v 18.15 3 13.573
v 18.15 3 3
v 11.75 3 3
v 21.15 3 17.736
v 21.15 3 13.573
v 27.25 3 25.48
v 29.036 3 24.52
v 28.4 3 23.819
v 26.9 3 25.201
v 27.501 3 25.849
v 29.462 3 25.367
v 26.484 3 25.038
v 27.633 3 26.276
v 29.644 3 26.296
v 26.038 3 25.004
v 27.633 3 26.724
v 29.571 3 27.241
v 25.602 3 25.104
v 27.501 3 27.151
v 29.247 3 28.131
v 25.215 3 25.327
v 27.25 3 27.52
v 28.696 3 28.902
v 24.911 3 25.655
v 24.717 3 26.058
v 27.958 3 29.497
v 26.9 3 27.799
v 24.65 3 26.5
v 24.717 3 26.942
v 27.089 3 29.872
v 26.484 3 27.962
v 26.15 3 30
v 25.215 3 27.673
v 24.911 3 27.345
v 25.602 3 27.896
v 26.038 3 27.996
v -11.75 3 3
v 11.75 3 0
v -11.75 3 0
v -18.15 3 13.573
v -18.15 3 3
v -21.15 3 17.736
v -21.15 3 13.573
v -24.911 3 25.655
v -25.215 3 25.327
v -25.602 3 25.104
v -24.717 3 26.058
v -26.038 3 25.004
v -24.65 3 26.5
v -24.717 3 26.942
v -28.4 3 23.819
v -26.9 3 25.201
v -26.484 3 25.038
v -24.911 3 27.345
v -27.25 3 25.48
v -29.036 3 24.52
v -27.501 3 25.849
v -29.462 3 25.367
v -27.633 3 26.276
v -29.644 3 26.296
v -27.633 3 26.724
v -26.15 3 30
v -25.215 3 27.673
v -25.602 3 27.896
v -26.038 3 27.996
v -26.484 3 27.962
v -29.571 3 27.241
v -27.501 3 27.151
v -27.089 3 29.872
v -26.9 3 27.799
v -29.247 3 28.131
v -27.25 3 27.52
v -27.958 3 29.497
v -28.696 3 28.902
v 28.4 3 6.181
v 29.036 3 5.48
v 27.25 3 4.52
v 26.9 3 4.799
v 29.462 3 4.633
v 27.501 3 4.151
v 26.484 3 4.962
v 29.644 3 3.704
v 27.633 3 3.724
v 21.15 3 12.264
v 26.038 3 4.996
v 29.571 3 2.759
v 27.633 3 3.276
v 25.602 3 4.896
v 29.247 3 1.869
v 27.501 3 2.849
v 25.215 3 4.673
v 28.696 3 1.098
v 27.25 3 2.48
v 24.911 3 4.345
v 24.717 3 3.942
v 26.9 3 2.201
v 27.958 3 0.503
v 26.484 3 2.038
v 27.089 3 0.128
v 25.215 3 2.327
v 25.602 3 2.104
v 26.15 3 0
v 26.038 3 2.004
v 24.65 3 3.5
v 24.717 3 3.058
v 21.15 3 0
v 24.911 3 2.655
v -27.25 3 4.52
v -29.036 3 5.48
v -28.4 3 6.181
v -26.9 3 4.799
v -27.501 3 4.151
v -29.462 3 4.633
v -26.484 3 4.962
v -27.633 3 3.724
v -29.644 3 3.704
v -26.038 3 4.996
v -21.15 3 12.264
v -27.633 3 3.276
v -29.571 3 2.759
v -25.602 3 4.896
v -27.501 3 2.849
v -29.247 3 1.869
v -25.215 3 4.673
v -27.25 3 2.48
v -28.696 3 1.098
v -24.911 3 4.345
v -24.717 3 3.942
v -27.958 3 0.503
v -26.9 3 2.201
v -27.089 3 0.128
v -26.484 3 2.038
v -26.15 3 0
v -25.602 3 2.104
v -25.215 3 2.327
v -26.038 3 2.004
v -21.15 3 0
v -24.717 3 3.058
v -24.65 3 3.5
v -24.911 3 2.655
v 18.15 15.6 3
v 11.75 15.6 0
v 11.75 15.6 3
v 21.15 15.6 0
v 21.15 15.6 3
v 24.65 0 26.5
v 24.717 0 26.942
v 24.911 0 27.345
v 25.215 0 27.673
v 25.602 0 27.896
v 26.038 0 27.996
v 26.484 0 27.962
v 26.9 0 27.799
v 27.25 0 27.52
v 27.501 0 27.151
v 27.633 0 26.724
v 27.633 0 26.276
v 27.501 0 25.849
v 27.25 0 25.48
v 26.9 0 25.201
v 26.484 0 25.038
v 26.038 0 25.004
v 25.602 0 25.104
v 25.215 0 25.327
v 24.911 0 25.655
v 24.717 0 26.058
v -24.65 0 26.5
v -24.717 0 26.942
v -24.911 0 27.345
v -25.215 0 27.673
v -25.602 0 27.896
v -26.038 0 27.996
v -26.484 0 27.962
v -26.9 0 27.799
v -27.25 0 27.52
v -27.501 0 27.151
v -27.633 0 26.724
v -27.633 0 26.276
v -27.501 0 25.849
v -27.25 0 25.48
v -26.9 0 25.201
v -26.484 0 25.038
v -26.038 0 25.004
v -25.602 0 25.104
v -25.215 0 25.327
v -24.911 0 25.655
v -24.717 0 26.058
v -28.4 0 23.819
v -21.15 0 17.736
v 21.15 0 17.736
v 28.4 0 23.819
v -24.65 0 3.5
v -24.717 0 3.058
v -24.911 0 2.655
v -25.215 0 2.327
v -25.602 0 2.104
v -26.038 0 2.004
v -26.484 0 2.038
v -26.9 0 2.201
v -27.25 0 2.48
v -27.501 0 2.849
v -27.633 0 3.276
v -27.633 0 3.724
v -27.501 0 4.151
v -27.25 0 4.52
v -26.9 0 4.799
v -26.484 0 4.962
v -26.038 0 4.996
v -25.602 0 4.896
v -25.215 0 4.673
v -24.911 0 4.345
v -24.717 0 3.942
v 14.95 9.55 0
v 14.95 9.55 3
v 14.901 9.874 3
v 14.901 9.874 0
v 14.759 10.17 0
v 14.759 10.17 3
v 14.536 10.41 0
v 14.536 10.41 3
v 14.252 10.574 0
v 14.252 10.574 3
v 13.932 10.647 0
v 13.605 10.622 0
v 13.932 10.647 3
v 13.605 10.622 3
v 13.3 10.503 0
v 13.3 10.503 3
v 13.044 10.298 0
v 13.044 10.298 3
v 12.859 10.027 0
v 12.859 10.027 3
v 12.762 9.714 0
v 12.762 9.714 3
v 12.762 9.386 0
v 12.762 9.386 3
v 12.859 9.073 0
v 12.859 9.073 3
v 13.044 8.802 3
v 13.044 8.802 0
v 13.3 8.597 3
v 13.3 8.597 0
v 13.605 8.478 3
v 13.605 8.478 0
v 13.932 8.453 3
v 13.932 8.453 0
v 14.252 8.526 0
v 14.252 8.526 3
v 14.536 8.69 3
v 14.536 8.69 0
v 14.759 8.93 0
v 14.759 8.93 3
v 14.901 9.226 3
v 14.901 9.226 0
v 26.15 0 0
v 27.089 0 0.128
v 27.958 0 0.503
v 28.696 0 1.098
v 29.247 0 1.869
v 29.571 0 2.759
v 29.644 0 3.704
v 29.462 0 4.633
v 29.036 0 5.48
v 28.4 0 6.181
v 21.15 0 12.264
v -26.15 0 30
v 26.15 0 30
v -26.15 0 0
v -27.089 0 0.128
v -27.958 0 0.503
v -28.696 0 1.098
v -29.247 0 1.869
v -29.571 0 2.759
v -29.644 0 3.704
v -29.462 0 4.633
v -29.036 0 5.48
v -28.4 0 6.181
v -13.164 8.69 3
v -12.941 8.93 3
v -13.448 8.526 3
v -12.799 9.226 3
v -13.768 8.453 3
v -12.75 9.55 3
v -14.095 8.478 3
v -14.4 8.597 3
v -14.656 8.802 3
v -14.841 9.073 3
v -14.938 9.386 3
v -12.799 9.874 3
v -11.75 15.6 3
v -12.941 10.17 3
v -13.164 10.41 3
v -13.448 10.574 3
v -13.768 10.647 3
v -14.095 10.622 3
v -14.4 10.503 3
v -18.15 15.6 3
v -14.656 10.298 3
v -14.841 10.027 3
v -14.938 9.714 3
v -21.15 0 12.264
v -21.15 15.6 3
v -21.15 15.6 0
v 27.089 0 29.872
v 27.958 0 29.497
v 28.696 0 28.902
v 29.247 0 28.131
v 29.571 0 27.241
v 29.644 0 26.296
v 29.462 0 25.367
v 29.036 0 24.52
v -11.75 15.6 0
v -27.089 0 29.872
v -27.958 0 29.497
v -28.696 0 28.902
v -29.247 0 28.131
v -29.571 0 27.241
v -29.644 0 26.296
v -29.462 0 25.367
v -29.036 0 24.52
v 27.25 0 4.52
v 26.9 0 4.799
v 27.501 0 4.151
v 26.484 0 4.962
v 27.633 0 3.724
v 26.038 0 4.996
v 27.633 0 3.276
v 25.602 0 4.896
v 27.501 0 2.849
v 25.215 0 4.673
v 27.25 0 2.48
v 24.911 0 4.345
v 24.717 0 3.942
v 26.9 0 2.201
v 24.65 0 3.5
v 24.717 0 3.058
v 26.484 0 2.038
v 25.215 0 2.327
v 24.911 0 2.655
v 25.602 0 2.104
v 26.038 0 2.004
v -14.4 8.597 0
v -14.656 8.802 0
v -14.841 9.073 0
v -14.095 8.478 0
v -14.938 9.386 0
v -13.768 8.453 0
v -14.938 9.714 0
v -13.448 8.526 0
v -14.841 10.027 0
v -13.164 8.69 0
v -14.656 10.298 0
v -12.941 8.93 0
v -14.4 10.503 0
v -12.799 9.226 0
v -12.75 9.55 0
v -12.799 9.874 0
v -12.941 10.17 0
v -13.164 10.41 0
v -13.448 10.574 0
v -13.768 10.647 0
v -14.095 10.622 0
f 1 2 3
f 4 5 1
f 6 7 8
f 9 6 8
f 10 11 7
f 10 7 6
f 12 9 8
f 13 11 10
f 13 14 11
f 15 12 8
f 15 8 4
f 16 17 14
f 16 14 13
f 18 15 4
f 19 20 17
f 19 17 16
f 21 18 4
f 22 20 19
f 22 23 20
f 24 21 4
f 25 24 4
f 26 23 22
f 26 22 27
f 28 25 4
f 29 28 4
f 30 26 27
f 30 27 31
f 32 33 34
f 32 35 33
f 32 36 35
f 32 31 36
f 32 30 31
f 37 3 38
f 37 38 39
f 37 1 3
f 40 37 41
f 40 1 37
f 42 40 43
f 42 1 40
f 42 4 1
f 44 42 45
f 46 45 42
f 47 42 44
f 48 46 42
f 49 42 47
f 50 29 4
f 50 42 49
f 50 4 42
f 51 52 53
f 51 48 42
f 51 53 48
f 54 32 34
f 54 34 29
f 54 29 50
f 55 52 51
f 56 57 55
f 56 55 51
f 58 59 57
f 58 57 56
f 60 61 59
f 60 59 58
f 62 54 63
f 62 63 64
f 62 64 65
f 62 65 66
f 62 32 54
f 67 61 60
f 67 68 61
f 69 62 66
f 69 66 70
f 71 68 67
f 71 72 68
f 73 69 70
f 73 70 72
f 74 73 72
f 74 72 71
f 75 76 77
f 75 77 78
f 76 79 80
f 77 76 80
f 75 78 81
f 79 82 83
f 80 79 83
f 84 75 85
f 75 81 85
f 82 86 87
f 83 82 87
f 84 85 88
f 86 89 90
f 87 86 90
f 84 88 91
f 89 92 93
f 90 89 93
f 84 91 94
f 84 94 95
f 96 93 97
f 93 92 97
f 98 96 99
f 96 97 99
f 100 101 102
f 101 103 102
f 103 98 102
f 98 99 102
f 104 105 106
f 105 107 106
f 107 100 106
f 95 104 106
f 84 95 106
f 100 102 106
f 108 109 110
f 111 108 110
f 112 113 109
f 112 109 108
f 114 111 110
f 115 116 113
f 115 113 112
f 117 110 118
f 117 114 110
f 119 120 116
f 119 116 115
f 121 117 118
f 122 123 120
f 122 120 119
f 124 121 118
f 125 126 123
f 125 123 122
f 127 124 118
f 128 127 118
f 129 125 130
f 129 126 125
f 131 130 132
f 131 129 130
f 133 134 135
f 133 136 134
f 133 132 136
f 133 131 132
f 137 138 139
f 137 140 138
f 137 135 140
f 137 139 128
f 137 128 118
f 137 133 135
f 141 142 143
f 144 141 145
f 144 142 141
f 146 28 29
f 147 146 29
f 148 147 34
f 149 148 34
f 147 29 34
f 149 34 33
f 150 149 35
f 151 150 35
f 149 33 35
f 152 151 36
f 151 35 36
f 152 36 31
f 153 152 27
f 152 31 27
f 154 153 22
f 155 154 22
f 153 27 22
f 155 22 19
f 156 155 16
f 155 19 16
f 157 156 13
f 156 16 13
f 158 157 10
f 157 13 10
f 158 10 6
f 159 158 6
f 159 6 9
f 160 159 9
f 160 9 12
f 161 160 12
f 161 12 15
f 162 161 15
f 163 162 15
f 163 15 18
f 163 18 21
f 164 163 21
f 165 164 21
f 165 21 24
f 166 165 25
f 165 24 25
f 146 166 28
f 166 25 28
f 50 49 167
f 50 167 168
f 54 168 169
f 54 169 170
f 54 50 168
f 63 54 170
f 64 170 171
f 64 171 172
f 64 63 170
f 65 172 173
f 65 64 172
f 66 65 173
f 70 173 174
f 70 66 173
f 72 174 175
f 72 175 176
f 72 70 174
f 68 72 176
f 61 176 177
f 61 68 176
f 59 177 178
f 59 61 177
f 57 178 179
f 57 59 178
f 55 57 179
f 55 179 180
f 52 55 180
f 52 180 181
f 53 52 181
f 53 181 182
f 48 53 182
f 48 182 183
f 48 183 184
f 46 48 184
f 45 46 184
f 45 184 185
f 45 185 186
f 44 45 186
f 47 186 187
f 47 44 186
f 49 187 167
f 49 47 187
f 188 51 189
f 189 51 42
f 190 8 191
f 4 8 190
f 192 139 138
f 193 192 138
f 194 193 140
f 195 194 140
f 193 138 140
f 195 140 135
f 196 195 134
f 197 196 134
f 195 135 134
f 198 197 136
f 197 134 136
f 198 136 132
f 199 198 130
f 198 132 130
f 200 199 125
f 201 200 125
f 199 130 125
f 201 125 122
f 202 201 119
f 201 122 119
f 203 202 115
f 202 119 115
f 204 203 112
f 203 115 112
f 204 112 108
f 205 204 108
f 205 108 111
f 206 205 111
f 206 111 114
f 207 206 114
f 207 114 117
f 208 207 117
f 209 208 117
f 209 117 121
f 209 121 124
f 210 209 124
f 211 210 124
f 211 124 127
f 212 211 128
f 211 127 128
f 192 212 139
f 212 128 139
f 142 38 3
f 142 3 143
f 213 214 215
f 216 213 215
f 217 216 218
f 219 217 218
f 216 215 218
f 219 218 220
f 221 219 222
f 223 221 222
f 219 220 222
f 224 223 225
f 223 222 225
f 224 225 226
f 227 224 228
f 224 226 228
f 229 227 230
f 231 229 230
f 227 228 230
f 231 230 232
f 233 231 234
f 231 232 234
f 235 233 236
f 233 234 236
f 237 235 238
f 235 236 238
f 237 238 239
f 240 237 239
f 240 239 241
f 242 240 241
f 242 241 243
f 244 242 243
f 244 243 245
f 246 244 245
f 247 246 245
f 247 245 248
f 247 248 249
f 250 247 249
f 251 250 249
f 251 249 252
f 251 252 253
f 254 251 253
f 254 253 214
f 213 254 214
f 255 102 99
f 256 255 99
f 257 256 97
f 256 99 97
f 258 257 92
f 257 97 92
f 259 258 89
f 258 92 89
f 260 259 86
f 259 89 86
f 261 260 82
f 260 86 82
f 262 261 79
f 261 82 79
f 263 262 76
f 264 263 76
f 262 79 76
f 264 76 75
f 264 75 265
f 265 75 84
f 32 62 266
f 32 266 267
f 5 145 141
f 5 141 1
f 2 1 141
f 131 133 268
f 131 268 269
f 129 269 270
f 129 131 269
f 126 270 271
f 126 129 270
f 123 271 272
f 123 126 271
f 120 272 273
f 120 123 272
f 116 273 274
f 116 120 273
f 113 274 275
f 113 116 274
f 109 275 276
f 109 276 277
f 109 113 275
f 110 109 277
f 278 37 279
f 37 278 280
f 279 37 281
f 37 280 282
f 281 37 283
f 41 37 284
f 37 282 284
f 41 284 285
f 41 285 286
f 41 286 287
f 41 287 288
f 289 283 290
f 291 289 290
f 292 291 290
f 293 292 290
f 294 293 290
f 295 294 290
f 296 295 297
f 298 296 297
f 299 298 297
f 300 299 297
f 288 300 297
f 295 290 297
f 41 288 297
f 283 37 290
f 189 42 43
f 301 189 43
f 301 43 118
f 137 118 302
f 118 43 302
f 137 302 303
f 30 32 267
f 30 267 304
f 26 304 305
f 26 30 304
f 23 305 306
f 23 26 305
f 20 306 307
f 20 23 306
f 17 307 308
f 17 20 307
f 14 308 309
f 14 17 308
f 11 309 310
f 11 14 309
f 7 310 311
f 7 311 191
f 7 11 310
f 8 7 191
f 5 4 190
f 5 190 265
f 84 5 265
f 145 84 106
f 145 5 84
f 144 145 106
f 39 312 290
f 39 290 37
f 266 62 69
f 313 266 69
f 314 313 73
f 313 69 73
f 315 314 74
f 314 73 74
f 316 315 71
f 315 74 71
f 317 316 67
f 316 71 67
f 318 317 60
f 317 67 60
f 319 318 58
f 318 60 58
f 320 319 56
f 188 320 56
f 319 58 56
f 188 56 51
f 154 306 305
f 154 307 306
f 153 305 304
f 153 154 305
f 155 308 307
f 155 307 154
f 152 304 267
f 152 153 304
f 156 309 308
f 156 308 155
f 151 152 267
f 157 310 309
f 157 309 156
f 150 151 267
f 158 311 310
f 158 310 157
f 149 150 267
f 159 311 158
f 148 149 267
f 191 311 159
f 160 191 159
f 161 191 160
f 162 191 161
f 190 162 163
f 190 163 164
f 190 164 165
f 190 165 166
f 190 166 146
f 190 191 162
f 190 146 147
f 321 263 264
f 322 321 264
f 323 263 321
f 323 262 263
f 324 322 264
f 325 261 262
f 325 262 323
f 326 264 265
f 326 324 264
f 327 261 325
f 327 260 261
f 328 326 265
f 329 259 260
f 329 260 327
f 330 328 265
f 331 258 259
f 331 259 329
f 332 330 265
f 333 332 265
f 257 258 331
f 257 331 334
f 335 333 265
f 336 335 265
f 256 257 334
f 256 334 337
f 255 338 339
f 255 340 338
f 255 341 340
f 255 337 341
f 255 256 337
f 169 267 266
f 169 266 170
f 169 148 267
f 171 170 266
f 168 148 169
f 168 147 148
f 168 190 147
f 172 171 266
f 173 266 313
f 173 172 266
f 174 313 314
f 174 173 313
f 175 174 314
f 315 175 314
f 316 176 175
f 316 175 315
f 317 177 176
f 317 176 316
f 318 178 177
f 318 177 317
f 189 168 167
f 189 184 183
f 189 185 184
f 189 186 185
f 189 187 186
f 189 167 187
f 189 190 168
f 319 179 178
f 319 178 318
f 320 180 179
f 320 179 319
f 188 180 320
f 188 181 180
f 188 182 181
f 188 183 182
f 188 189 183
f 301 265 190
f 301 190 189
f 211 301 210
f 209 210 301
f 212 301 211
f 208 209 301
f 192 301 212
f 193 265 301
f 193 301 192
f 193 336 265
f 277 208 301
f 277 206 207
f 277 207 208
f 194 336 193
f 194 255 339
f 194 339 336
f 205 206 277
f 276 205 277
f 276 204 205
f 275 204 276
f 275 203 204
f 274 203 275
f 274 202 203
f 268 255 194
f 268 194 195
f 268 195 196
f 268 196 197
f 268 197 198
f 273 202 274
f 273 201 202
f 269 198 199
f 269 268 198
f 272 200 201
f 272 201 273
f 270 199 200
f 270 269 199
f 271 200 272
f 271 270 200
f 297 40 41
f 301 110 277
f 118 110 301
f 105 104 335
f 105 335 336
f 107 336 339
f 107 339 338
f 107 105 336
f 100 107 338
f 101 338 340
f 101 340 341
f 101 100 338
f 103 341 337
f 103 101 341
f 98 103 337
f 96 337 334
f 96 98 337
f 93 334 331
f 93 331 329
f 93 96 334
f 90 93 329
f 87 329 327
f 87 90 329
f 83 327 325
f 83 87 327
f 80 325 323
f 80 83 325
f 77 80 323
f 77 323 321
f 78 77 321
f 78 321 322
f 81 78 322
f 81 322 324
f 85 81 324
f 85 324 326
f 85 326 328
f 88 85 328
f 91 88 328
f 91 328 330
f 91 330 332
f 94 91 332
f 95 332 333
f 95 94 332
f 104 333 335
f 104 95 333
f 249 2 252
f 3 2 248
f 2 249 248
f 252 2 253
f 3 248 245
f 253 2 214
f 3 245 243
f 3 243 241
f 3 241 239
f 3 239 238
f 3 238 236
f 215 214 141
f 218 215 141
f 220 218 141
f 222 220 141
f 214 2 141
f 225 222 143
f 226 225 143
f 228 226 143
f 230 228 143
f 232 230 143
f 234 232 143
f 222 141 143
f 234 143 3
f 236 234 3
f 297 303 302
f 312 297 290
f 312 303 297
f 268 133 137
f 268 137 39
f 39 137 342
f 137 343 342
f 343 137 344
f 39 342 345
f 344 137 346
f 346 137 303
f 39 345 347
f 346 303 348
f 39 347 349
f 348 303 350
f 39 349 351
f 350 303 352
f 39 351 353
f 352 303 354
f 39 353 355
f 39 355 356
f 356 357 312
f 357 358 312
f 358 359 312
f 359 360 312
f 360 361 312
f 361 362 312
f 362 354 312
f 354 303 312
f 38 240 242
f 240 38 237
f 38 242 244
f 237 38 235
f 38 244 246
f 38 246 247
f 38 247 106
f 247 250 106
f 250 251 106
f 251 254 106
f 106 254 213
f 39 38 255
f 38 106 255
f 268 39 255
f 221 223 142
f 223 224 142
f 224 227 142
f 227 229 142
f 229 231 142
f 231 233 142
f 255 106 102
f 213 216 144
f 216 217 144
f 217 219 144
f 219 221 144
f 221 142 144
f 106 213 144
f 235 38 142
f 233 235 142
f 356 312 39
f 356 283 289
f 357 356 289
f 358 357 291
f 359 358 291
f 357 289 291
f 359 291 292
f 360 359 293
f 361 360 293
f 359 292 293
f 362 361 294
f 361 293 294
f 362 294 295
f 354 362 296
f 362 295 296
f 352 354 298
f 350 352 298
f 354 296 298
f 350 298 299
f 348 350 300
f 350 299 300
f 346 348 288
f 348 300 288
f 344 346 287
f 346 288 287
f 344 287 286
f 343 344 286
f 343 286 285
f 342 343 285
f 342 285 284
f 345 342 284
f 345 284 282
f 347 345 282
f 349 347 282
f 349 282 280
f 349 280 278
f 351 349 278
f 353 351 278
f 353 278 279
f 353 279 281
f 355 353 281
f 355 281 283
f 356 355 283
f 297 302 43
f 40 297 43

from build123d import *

# Parameters (mm, degrees)
BOSS_EXTRUDE1_DEPTH     = 3
SKETCH3_W               = 42.3
SKETCH3_H               = 30
BOSS_EXTRUDE2_DEPTH     = 3
SKETCH4_R               = 1.1
CUT_EXTRUDE1_DEPTH      = 4
BOSS_EXTRUDE3_DEPTH     = 3
BOSS_EXTRUDE4_START     = -3
SKETCH6_R               = 1.5
BOSS_EXTRUDE4_DEPTH     = 3
MIRROR3_START           = -3
MIRROR3_COPY_1_SKETCH_R = 1.5
MIRROR3_COPY_1_DEPTH    = 3


with BuildPart() as part:
    # Sketch2 → Boss-Extrude1 (new body)
    with BuildSketch(Plane.XY):
        Polygon((-11.75, 3), (11.75, 3), (11.75, 15.6), (21.15, 15.6), (21.15, 0), (-21.15, 0), (-21.15, 15.6), (-11.75, 15.6), align=None)
    extrude(amount=BOSS_EXTRUDE1_DEPTH)

    # Sketch3 → Boss-Extrude2 (add)
    with BuildSketch(Plane.XZ):
        with Locations((0, 15)):
            Rectangle(SKETCH3_W, SKETCH3_H)
    extrude(amount=-BOSS_EXTRUDE2_DEPTH)

    # Sketch4 → Cut-Extrude1 (cut, through all)
    with BuildSketch(Plane.XY.offset(3)):
        with Locations((13.85, 9.55)):
            Circle(SKETCH4_R)
        with Locations((-13.85, 9.55)):
            Circle(SKETCH4_R)
    extrude(amount=-CUT_EXTRUDE1_DEPTH, mode=Mode.SUBTRACT)

    # Sketch5 → Boss-Extrude3 (add)
    with BuildSketch(Plane(origin=(21.15, 0, 0), x_dir=(0, 0, -1), z_dir=(1, 0, 0))):
        Polygon((-3, 15.6), (-13.572655353, 3), (-3, 3), align=None)
    boss_extrude3 = extrude(amount=-BOSS_EXTRUDE3_DEPTH)

    # Mirror1: Boss-Extrude3 across plane
    add(boss_extrude3.mirror(Plane(origin=(0, 0, 0), x_dir=(0, 0, 1), z_dir=(1, 0, 0))))

    # Sketch6 → Boss-Extrude4 (add)
    with BuildSketch(Plane.XZ.offset(BOSS_EXTRUDE4_START)):
        with BuildLine():
            Line((-21.15, 30), (-26.15, 30))
            ThreePointArc((-26.15, 30), (-29.438924173, 27.697070502), (-28.399756634, 23.818844449))
            Line((-28.399756634, 23.818844449), (-21.15, 17.735576331))
            Line((-21.15, 17.735576331), (-21.15, 30))
        make_face()
        with Locations((-26.15, 26.5)):
            Circle(SKETCH6_R, mode=Mode.SUBTRACT)
    boss_extrude4 = extrude(amount=BOSS_EXTRUDE4_DEPTH)

    # Mirror2: Boss-Extrude4 across plane
    add(boss_extrude4.mirror(Plane.XY.offset(15)))

    # Mirror3: Boss-Extrude4 across plane
    add(boss_extrude4.mirror(Plane(origin=(0, 0, 0), x_dir=(0, 0, 1), z_dir=(1, 0, 0))))

    # Mirror3 copy 1 sketch → Mirror3 copy 1 (add)
    with BuildSketch(Plane(origin=(0, 0, 30), x_dir=(-1, 0, 0), z_dir=(0, -1, 0)).offset(MIRROR3_START)):
        with BuildLine():
            Line((-21.15, 30), (-26.15, 30))
            ThreePointArc((-26.15, 30), (-29.438924173, 27.697070502), (-28.399756634, 23.818844449))
            Line((-28.399756634, 23.818844449), (-21.15, 17.735576331))
            Line((-21.15, 17.735576331), (-21.15, 30))
        make_face()
        with Locations((-26.15, 26.5)):
            Circle(MIRROR3_COPY_1_SKETCH_R, mode=Mode.SUBTRACT)
    extrude(amount=MIRROR3_COPY_1_DEPTH)


solid = part.part
